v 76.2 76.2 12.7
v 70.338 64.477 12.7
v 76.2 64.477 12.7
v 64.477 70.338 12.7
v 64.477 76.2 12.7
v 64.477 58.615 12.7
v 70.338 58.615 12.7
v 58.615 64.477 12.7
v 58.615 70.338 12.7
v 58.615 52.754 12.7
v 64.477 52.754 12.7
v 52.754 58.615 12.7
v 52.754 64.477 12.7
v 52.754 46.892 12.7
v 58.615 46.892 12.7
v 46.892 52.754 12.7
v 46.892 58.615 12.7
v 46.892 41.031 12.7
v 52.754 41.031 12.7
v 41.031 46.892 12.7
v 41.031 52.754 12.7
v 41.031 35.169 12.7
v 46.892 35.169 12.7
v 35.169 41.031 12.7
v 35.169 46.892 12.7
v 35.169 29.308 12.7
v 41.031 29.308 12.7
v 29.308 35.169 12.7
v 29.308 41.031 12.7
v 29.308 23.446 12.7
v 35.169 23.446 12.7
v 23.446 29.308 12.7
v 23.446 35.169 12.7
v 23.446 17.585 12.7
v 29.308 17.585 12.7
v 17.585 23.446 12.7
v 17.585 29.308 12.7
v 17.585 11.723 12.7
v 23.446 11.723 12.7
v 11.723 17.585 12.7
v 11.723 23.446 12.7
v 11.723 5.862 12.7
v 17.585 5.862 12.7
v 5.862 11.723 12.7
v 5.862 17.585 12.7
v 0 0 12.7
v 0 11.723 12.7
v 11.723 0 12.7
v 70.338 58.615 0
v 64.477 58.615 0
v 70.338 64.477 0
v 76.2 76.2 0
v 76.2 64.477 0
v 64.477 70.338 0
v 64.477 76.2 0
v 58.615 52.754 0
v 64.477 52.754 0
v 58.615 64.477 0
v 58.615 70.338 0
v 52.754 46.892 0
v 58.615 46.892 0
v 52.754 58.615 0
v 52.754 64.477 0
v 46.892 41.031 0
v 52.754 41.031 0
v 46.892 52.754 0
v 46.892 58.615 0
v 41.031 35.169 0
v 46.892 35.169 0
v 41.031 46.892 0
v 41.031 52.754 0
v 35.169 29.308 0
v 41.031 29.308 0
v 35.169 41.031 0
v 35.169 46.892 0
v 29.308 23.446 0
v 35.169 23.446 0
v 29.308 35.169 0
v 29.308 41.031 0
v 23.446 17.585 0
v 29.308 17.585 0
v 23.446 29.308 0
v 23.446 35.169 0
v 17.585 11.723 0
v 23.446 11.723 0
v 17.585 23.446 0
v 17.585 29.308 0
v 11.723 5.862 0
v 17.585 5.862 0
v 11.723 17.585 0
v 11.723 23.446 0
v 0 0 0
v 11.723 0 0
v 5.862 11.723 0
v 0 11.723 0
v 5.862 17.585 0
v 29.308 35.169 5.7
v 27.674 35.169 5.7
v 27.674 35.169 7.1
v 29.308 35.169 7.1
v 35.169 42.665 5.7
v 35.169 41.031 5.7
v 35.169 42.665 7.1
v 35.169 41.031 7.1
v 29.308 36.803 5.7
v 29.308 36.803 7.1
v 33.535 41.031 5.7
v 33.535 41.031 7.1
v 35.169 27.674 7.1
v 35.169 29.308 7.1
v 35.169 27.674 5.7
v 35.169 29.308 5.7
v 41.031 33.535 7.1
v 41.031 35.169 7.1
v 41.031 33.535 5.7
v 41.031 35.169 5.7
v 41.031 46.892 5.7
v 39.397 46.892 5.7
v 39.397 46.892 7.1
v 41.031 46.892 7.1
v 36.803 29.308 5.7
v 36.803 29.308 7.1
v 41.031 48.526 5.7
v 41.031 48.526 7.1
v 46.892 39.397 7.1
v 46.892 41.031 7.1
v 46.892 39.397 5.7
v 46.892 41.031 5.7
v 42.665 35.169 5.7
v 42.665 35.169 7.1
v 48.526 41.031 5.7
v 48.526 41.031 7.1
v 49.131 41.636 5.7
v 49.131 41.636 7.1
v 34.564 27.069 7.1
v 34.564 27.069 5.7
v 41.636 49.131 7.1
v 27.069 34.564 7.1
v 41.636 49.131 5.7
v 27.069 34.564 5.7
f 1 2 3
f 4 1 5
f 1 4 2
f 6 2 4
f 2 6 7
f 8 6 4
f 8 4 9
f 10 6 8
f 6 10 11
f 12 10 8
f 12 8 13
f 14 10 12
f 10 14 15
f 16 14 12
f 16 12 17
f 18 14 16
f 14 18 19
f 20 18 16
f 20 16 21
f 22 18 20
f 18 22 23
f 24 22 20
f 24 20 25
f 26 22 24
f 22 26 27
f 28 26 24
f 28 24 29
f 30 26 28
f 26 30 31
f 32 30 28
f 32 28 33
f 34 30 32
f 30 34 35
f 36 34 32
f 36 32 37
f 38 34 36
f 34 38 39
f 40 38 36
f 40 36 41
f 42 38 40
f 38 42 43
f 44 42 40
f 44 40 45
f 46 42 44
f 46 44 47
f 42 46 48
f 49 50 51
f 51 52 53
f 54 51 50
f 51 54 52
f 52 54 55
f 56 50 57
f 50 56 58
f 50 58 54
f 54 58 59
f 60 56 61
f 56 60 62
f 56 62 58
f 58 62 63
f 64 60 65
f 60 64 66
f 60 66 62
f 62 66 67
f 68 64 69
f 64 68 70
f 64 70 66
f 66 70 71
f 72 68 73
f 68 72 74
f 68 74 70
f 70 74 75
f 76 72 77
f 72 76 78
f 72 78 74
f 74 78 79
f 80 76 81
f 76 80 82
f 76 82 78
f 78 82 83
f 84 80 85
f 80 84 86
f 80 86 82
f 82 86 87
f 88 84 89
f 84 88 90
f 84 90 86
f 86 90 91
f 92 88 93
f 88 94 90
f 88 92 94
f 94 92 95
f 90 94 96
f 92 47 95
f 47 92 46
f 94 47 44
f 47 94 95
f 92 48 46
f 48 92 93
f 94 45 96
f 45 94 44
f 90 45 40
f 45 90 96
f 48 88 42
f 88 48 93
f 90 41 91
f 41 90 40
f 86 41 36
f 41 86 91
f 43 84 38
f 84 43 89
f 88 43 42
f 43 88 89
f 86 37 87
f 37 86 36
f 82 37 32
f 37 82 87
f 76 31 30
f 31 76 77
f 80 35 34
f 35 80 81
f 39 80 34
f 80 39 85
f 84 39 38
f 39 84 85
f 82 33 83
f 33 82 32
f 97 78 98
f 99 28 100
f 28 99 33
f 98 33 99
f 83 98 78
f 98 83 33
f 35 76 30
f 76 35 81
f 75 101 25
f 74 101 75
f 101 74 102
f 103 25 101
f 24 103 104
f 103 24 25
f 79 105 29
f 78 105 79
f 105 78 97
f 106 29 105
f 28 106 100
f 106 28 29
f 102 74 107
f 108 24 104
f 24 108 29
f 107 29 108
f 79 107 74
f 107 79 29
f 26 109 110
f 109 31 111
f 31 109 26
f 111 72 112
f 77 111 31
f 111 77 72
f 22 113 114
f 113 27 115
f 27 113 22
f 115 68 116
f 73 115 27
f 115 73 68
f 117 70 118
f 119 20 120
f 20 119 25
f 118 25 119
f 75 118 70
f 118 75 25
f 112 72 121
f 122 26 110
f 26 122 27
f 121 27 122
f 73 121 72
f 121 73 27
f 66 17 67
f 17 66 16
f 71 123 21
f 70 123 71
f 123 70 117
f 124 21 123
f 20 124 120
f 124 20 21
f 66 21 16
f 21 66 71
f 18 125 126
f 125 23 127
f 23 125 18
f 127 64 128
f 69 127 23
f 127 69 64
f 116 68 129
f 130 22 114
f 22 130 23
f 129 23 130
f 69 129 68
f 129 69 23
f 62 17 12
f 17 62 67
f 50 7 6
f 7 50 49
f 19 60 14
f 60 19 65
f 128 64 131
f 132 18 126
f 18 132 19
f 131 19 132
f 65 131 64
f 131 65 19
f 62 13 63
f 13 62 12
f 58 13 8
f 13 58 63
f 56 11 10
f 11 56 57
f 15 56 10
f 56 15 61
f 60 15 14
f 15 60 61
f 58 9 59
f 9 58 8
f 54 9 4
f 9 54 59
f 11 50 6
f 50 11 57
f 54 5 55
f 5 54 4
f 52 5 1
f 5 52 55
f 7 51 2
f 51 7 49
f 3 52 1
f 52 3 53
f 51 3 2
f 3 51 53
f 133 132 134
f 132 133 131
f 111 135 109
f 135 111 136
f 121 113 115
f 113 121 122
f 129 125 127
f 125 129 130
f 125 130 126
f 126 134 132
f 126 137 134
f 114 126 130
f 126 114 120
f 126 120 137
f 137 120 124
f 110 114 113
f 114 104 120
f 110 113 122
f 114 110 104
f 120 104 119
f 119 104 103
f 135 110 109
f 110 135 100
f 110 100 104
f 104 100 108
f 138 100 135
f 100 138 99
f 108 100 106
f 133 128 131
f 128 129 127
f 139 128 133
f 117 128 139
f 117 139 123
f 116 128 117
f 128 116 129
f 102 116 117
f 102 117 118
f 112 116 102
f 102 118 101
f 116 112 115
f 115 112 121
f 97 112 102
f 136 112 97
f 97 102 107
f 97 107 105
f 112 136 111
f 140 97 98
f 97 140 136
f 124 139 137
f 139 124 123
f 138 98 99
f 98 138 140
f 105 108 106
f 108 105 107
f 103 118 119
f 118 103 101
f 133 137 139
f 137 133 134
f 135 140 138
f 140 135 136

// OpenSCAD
// stick — Minecraft Item Shape 3D Model
// Auto-generated from minecraft/textures/item/stick.png
//
// Open in OpenSCAD → F5 preview → F6 render → F7 export STL

// ============================================================
// PARAMETERS
// ============================================================

GRID_SIZE_IN    = 3.0;           // crafting table slot size
PIXELS          = 13;              // grid divisions (shape-fitted)
PIXEL_MM        = (GRID_SIZE_IN * 25.4) / PIXELS;  // mm per pixel

DEPTH_IN        = 0.5;          // extrusion depth in inches
DEPTH_MM        = DEPTH_IN * 25.4;

// NFC tag — small rectangular RFID sensor (10mm × 20mm)
// Rotated 45° to align with the stick's diagonal axis.
// The stick is 3 pixels wide (~17.6mm). Rotating the 10mm-wide tag
// 45° uses ~14.1mm of cross-section, leaving ~1.7mm wall on each side.
TAG_WIDTH       = 10;           // mm (short side)
TAG_LENGTH      = 20;           // mm (long side)
TAG_THICKNESS   = 1.0;         // mm
TAG_CLEARANCE   = 0.3;         // mm extra around tag

cavity_w = TAG_WIDTH + TAG_CLEARANCE * 2;
cavity_l = TAG_LENGTH + TAG_CLEARANCE * 2;
cavity_h = TAG_THICKNESS + TAG_CLEARANCE;

// Wall thickness check: stick is 3 pixels wide = 3 * PIXEL_MM = ~17.6mm
// Rotated cavity diagonal footprint = sqrt(cavity_w^2 + cavity_w^2) for the short axis
// = cavity_w * sqrt(2) = 10.6 * 1.414 = ~15.0mm
// Wall on each side = (17.6 - 15.0) / 2 = ~1.3mm — thin but printable

echo(str("Tag cavity: ", cavity_w, "mm × ", cavity_l, "mm × ", cavity_h, "mm deep (rotated 45°)"));
echo(str("PAUSE AT: ", DEPTH_MM / 2 + cavity_h / 2, "mm to insert tag"));

module tag_cavity() {
    // Center of the stick (pixel 6,6 is the middle of the diagonal)
    cx = (6.0 + 0.5) * PIXEL_MM;
    cy = (PIXELS - 1 - 6.0 + 0.5) * PIXEL_MM;
    translate([cx, cy, DEPTH_MM / 2 - cavity_h / 2])
        rotate([0, 0, -45])
            translate([-cavity_w / 2, -cavity_l / 2, 0])
                cube([cavity_w, cavity_l, cavity_h + 0.1]);
}

module tag_shelf() {
    cx = (6.0 + 0.5) * PIXEL_MM;
    cy = (PIXELS - 1 - 6.0 + 0.5) * PIXEL_MM;
    translate([cx, cy, DEPTH_MM / 2 - cavity_h / 2 - 1.0])
        rotate([0, 0, -45])
            translate([-(cavity_w + 4) / 2, -(cavity_l + 4) / 2, 0])
                cube([cavity_w + 4, cavity_l + 4, 1.0]);
}

echo(str("Pixel size: ", PIXEL_MM, "mm"));
echo(str("Footprint: ", PIXELS * PIXEL_MM, "mm = ", GRID_SIZE_IN, " in"));
echo(str("Depth: ", DEPTH_MM, "mm = ", DEPTH_IN, " in"));

// ============================================================
// PIXEL MAP — 37 opaque pixels
// ============================================================

item_pixels = [
    [0.0,11.0], [0.0,12.0], [1.0,10.0], [1.0,11.0], [1.0,12.0], [2.0,9.0], [2.0,10.0], [2.0,11.0],
    [3.0,8.0], [3.0,9.0], [3.0,10.0], [4.0,7.0], [4.0,8.0], [4.0,9.0], [5.0,6.0], [5.0,7.0],
    [5.0,8.0], [6.0,5.0], [6.0,6.0], [6.0,7.0], [7.0,4.0], [7.0,5.0], [7.0,6.0], [8.0,3.0],
    [8.0,4.0], [8.0,5.0], [9.0,2.0], [9.0,3.0], [9.0,4.0], [10.0,1.0], [10.0,2.0], [10.0,3.0],
    [11.0,0.0], [11.0,1.0], [11.0,2.0], [12.0,0.0], [12.0,1.0]
];

// ============================================================
// MODULES
// ============================================================

module pixel_block(col, row) {
    translate([col * PIXEL_MM, (PIXELS - 1 - row) * PIXEL_MM, 0])
        cube([PIXEL_MM, PIXEL_MM, DEPTH_MM]);
}

module item_shape() {
    for (i = [0 : len(item_pixels) - 1])
        pixel_block(item_pixels[i][0], item_pixels[i][1]);
}

module item_final() {
    difference() {
        union() {
            item_shape();
            intersection() {
                item_shape();
                tag_shelf();
            }
        }
        tag_cavity();
    }
}

item_final();

// Cross-section view (uncomment to see tag cavity):
// difference() {
//     item_final();
//     translate([8 * PIXEL_MM + 50, 0, 0])
//         cube([100, 200, 100]);
// }
